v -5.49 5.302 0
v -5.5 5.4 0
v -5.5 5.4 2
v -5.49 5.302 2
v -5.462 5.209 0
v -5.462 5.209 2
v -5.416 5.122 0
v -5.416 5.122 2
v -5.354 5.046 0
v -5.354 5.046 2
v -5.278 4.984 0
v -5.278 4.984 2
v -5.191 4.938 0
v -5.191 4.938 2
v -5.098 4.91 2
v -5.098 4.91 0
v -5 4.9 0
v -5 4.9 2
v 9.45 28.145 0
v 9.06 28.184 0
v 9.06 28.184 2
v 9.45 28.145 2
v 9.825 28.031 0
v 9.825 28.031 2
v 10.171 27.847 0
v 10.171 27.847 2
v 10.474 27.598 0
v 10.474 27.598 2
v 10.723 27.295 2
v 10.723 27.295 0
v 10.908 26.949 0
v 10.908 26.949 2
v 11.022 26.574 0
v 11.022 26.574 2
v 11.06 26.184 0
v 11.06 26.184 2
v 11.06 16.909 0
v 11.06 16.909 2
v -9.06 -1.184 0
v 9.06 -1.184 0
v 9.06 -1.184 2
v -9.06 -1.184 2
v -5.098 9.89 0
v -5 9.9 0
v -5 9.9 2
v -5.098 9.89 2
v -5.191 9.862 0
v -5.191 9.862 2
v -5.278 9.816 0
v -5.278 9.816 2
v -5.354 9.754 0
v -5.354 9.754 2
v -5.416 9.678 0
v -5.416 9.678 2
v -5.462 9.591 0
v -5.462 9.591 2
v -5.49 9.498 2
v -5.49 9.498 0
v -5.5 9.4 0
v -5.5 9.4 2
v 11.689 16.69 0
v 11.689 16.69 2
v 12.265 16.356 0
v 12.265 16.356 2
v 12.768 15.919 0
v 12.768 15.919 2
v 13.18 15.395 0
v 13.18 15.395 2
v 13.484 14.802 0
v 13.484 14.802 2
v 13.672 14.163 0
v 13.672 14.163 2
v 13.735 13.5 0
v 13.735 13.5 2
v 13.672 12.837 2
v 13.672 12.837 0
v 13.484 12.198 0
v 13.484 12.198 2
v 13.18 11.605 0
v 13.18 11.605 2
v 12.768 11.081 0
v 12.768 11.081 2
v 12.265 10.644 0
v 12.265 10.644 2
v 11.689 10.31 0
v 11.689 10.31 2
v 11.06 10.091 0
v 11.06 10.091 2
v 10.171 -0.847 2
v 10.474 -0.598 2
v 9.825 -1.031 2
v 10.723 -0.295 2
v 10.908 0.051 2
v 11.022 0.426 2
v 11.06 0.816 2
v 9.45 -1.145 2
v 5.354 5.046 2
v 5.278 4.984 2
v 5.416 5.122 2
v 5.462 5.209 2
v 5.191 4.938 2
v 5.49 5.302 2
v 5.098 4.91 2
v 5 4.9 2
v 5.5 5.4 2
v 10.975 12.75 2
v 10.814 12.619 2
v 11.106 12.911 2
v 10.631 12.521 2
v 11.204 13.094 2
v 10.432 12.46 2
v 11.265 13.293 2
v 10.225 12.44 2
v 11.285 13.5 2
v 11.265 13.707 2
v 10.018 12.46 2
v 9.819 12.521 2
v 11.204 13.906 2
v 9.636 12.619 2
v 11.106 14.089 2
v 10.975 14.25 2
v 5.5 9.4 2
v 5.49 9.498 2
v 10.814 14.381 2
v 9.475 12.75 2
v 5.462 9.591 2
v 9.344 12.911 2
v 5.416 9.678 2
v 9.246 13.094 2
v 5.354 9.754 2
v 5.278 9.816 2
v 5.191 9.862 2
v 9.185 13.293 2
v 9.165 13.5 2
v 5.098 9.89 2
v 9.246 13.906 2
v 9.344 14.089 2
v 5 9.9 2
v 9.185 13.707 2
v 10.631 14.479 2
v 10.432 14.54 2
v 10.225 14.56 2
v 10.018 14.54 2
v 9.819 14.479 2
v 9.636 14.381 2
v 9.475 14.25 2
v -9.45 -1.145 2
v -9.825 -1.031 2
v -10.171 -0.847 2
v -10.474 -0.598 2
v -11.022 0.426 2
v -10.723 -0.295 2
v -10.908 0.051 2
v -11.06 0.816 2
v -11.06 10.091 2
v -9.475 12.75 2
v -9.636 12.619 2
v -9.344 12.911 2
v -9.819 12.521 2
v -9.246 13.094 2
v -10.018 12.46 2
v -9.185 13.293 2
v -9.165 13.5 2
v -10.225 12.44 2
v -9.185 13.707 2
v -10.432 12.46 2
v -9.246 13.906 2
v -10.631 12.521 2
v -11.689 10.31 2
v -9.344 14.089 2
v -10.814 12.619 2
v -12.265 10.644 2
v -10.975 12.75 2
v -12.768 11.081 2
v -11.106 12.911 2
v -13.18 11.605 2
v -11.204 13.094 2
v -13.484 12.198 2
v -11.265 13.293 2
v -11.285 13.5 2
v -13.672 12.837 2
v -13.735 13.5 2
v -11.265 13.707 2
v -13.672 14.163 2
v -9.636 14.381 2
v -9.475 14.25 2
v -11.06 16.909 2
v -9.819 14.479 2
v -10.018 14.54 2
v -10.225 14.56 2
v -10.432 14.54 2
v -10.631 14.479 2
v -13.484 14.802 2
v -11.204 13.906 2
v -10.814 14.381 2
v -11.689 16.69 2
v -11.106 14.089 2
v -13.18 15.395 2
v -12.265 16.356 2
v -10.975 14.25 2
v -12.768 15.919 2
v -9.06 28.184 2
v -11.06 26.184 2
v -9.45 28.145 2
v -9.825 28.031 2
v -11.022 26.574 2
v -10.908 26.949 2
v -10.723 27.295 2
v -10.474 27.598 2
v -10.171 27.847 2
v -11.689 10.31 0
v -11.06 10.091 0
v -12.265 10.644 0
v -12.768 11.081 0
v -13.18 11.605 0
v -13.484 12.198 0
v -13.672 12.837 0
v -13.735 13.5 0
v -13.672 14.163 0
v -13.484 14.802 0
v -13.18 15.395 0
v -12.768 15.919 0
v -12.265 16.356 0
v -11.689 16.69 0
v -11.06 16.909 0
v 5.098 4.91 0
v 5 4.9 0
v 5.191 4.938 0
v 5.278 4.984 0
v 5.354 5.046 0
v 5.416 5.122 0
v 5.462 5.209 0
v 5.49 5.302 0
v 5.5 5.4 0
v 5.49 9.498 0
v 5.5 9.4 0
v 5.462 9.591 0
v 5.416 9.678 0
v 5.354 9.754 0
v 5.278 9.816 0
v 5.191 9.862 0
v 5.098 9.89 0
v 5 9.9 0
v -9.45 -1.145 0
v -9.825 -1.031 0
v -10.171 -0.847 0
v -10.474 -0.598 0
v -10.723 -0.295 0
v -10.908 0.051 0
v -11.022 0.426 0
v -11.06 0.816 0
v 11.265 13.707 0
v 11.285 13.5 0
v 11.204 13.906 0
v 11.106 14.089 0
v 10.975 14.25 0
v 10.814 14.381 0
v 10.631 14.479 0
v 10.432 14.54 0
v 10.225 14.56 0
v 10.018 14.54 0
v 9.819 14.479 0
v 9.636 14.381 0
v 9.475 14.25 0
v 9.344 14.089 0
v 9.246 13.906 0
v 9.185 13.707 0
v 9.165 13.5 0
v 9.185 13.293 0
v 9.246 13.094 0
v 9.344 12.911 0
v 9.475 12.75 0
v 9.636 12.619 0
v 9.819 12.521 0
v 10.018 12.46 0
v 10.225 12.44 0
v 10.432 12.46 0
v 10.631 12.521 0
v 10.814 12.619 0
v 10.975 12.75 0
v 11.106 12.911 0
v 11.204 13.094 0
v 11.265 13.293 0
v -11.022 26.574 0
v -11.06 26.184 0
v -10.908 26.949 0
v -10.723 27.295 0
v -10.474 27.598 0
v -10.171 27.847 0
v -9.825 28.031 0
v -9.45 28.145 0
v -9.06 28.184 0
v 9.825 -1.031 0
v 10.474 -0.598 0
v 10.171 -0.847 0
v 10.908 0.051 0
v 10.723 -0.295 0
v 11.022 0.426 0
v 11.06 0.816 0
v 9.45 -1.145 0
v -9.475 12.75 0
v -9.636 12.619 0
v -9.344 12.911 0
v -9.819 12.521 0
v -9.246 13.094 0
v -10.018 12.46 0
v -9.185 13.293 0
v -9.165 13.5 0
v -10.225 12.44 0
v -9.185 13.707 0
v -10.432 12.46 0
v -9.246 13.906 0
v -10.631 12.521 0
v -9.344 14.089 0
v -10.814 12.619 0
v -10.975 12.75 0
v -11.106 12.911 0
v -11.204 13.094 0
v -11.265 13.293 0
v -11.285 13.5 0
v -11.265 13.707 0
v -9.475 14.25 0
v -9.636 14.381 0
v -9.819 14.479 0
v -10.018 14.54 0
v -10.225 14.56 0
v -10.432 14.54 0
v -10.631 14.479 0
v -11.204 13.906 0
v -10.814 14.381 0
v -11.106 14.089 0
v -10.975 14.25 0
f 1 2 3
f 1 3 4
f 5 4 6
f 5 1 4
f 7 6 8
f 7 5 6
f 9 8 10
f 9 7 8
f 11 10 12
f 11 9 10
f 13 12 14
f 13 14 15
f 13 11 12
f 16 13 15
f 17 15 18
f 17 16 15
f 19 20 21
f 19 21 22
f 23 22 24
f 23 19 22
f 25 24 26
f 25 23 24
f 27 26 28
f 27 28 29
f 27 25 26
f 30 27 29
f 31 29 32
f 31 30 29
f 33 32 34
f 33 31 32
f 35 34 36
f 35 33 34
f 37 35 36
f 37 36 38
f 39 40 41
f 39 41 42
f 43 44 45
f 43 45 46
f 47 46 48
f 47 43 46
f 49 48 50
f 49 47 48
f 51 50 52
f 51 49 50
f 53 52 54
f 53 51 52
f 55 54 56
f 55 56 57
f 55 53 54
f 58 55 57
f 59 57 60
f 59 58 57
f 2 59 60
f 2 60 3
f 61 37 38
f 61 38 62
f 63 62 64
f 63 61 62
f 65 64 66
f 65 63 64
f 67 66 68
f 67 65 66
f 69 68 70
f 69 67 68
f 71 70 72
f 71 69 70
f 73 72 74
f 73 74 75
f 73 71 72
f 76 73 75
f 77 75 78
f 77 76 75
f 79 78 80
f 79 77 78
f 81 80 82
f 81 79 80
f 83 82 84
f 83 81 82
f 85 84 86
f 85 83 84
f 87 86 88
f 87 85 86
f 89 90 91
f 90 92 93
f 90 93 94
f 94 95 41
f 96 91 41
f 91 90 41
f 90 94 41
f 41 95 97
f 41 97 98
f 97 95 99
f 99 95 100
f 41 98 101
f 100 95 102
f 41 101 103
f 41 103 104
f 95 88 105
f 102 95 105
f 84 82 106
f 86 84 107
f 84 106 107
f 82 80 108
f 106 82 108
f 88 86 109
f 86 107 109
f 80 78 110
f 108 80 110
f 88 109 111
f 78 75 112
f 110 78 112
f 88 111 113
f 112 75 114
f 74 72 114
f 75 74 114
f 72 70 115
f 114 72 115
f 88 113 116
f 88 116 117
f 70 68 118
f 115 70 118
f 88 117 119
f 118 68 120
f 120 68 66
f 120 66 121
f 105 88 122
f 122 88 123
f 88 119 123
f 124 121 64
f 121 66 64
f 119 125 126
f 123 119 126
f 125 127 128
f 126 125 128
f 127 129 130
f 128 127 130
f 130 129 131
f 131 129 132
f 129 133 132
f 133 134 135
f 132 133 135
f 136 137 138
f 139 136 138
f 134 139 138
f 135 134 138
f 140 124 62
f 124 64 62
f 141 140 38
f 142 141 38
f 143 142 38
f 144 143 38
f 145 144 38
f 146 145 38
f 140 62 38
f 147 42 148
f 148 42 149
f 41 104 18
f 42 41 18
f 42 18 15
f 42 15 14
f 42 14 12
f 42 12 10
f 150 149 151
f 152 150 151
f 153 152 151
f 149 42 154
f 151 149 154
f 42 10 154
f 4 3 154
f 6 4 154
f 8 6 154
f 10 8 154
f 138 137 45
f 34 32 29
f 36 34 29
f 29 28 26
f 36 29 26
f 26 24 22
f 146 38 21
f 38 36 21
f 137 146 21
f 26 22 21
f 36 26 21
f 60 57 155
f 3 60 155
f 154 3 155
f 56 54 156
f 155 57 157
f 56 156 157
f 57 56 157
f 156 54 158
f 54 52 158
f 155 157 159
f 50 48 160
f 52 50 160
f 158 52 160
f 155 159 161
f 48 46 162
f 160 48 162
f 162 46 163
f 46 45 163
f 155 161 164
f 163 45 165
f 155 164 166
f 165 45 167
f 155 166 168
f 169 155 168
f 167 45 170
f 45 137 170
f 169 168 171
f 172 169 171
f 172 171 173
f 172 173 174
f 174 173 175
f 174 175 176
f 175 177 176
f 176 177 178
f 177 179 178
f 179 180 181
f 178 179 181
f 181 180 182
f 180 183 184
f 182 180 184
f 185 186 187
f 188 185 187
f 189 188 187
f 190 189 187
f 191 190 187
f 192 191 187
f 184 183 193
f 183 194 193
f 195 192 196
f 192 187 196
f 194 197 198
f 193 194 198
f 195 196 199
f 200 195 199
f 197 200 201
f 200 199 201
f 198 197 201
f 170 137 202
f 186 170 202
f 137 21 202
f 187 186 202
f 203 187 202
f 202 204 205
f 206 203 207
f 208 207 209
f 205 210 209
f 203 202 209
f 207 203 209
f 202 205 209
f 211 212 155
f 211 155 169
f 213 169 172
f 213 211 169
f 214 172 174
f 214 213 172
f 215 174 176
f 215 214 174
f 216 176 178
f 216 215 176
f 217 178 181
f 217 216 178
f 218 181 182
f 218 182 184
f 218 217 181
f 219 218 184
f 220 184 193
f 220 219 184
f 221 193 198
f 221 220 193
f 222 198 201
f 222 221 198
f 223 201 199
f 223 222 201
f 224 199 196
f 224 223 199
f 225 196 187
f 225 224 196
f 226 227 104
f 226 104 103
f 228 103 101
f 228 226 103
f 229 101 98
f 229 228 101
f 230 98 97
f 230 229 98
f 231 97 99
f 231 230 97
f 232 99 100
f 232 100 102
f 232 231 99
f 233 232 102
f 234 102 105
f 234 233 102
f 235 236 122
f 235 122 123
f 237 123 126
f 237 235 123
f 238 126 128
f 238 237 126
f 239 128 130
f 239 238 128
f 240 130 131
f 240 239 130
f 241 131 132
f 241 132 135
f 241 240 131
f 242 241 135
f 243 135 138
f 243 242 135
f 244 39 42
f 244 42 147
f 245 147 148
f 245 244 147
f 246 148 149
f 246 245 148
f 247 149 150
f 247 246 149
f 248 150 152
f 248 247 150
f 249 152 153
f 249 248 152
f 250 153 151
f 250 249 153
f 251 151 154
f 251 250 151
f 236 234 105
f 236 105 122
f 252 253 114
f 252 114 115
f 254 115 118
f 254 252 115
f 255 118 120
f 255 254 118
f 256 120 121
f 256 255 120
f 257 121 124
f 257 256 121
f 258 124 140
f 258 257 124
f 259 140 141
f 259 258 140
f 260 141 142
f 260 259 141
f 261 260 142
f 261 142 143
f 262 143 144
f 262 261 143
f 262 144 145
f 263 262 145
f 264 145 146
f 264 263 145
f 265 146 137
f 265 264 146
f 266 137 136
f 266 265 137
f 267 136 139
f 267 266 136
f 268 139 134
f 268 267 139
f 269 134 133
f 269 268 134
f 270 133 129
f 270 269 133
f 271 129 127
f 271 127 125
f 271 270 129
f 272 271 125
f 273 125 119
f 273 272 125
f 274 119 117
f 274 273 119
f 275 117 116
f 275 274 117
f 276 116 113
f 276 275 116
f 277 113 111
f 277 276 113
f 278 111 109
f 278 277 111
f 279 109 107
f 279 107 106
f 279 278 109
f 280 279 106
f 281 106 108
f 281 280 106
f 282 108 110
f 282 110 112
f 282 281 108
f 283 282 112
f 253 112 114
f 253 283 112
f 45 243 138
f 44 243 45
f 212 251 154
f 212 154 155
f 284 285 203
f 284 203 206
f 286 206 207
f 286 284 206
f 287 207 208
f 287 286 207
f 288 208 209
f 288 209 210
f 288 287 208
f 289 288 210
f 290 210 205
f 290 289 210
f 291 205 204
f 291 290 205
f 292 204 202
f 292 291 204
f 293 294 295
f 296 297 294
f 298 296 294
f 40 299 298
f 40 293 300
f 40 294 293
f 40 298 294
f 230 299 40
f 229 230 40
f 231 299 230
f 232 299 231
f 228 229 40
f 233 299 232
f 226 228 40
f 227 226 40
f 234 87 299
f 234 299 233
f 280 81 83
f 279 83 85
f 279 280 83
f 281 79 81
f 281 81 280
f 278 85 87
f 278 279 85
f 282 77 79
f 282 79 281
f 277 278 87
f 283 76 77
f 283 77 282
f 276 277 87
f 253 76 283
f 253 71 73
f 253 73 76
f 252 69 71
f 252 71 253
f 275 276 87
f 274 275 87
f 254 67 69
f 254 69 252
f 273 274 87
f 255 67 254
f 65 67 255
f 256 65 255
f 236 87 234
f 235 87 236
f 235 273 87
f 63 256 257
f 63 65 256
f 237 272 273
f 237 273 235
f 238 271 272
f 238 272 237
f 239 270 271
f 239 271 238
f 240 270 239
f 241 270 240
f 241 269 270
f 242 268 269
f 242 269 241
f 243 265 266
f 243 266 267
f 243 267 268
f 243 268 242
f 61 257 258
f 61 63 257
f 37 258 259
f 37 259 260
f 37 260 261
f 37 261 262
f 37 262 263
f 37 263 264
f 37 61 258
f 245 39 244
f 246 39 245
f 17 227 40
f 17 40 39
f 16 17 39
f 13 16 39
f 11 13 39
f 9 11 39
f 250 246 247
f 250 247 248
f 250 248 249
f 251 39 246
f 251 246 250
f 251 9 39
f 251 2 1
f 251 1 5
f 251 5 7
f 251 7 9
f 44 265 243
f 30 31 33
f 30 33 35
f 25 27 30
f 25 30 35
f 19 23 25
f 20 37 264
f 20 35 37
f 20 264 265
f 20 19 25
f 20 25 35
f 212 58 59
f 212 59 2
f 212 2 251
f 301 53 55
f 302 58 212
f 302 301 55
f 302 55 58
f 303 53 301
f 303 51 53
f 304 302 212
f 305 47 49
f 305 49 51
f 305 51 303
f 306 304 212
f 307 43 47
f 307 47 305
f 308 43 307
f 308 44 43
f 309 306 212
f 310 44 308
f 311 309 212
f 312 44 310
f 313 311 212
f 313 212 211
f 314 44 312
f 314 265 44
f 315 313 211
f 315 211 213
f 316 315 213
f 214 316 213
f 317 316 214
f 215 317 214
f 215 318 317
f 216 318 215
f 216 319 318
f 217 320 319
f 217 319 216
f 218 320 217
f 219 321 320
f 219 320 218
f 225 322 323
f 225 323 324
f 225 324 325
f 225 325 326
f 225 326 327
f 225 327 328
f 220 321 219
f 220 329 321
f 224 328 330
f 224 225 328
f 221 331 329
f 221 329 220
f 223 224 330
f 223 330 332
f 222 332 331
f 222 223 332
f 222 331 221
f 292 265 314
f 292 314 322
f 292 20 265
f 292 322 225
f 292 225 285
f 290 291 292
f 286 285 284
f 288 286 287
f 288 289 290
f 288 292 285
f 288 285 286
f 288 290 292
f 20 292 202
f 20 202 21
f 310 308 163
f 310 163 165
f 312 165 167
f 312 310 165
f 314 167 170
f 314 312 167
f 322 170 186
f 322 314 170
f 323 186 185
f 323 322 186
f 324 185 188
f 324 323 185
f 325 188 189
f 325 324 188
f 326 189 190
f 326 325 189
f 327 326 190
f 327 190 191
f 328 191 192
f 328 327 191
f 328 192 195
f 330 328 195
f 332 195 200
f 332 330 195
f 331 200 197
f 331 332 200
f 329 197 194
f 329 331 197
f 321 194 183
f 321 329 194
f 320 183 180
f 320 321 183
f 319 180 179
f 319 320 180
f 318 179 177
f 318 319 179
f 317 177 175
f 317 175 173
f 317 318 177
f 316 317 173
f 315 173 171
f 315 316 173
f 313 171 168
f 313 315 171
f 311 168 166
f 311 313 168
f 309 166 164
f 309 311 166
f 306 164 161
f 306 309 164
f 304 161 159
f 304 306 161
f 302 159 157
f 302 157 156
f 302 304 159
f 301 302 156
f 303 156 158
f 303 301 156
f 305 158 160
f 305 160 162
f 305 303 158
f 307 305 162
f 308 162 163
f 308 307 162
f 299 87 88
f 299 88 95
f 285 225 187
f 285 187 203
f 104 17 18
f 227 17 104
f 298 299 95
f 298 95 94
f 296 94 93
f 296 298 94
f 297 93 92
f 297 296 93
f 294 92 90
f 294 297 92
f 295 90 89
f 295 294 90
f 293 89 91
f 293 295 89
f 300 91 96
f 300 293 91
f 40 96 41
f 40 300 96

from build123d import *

# Parameters (mm, degrees)
SKETCH1_R           = 1.06
BOSS_EXTRUDE1_DEPTH = 2


with BuildPart() as part:
    # Sketch1 → Boss-Extrude1 (new body)
    with BuildSketch(Plane.XY):
        with BuildLine():
            Line((9.06, 28.183587826), (-9.06, 28.183587826))
            ThreePointArc((-9.06, 28.183587826), (-10.474213562, 27.597801388), (-11.06, 26.183587826))
            Line((-11.06, 26.183587826), (-11.06, 16.909233785))
            ThreePointArc((-11.06, 16.909233785), (-13.735, 13.5), (-11.06, 10.090766215))
            Line((-11.06, 10.090766215), (-11.06, 0.816412174))
            ThreePointArc((-11.06, 0.816412174), (-10.474213562, -0.597801388), (-9.06, -1.183587826))
            Line((-9.06, -1.183587826), (9.06, -1.183587826))
            ThreePointArc((9.06, -1.183587826), (10.474213562, -0.597801388), (11.06, 0.816412174))
            Line((11.06, 0.816412174), (11.06, 10.090766215))
            ThreePointArc((11.06, 10.090766215), (13.735, 13.5), (11.06, 16.909233785))
            Line((11.06, 16.909233785), (11.06, 26.183587826))
            ThreePointArc((11.06, 26.183587826), (10.474213562, 27.597801388), (9.06, 28.183587826))
        make_face()
        with Locations((-10.225, 13.5)):
            Circle(SKETCH1_R, mode=Mode.SUBTRACT)
        with BuildLine():
            Line((5, 4.9), (-5, 4.9))
            ThreePointArc((-5, 4.9), (-5.353553391, 5.046446609), (-5.5, 5.4))
            Line((-5.5, 5.4), (-5.5, 9.4))
            ThreePointArc((-5.5, 9.4), (-5.353553391, 9.753553391), (-5, 9.9))
            Line((-5, 9.9), (5, 9.9))
            ThreePointArc((5, 9.9), (5.353553391, 9.753553391), (5.5, 9.4))
            Line((5.5, 9.4), (5.5, 5.4))
            ThreePointArc((5.5, 5.4), (5.353553391, 5.046446609), (5, 4.9))
        make_face(mode=Mode.SUBTRACT)
        with Locations((10.225, 13.5)):
            Circle(SKETCH1_R, mode=Mode.SUBTRACT)
    extrude(amount=BOSS_EXTRUDE1_DEPTH)


solid = part.part
